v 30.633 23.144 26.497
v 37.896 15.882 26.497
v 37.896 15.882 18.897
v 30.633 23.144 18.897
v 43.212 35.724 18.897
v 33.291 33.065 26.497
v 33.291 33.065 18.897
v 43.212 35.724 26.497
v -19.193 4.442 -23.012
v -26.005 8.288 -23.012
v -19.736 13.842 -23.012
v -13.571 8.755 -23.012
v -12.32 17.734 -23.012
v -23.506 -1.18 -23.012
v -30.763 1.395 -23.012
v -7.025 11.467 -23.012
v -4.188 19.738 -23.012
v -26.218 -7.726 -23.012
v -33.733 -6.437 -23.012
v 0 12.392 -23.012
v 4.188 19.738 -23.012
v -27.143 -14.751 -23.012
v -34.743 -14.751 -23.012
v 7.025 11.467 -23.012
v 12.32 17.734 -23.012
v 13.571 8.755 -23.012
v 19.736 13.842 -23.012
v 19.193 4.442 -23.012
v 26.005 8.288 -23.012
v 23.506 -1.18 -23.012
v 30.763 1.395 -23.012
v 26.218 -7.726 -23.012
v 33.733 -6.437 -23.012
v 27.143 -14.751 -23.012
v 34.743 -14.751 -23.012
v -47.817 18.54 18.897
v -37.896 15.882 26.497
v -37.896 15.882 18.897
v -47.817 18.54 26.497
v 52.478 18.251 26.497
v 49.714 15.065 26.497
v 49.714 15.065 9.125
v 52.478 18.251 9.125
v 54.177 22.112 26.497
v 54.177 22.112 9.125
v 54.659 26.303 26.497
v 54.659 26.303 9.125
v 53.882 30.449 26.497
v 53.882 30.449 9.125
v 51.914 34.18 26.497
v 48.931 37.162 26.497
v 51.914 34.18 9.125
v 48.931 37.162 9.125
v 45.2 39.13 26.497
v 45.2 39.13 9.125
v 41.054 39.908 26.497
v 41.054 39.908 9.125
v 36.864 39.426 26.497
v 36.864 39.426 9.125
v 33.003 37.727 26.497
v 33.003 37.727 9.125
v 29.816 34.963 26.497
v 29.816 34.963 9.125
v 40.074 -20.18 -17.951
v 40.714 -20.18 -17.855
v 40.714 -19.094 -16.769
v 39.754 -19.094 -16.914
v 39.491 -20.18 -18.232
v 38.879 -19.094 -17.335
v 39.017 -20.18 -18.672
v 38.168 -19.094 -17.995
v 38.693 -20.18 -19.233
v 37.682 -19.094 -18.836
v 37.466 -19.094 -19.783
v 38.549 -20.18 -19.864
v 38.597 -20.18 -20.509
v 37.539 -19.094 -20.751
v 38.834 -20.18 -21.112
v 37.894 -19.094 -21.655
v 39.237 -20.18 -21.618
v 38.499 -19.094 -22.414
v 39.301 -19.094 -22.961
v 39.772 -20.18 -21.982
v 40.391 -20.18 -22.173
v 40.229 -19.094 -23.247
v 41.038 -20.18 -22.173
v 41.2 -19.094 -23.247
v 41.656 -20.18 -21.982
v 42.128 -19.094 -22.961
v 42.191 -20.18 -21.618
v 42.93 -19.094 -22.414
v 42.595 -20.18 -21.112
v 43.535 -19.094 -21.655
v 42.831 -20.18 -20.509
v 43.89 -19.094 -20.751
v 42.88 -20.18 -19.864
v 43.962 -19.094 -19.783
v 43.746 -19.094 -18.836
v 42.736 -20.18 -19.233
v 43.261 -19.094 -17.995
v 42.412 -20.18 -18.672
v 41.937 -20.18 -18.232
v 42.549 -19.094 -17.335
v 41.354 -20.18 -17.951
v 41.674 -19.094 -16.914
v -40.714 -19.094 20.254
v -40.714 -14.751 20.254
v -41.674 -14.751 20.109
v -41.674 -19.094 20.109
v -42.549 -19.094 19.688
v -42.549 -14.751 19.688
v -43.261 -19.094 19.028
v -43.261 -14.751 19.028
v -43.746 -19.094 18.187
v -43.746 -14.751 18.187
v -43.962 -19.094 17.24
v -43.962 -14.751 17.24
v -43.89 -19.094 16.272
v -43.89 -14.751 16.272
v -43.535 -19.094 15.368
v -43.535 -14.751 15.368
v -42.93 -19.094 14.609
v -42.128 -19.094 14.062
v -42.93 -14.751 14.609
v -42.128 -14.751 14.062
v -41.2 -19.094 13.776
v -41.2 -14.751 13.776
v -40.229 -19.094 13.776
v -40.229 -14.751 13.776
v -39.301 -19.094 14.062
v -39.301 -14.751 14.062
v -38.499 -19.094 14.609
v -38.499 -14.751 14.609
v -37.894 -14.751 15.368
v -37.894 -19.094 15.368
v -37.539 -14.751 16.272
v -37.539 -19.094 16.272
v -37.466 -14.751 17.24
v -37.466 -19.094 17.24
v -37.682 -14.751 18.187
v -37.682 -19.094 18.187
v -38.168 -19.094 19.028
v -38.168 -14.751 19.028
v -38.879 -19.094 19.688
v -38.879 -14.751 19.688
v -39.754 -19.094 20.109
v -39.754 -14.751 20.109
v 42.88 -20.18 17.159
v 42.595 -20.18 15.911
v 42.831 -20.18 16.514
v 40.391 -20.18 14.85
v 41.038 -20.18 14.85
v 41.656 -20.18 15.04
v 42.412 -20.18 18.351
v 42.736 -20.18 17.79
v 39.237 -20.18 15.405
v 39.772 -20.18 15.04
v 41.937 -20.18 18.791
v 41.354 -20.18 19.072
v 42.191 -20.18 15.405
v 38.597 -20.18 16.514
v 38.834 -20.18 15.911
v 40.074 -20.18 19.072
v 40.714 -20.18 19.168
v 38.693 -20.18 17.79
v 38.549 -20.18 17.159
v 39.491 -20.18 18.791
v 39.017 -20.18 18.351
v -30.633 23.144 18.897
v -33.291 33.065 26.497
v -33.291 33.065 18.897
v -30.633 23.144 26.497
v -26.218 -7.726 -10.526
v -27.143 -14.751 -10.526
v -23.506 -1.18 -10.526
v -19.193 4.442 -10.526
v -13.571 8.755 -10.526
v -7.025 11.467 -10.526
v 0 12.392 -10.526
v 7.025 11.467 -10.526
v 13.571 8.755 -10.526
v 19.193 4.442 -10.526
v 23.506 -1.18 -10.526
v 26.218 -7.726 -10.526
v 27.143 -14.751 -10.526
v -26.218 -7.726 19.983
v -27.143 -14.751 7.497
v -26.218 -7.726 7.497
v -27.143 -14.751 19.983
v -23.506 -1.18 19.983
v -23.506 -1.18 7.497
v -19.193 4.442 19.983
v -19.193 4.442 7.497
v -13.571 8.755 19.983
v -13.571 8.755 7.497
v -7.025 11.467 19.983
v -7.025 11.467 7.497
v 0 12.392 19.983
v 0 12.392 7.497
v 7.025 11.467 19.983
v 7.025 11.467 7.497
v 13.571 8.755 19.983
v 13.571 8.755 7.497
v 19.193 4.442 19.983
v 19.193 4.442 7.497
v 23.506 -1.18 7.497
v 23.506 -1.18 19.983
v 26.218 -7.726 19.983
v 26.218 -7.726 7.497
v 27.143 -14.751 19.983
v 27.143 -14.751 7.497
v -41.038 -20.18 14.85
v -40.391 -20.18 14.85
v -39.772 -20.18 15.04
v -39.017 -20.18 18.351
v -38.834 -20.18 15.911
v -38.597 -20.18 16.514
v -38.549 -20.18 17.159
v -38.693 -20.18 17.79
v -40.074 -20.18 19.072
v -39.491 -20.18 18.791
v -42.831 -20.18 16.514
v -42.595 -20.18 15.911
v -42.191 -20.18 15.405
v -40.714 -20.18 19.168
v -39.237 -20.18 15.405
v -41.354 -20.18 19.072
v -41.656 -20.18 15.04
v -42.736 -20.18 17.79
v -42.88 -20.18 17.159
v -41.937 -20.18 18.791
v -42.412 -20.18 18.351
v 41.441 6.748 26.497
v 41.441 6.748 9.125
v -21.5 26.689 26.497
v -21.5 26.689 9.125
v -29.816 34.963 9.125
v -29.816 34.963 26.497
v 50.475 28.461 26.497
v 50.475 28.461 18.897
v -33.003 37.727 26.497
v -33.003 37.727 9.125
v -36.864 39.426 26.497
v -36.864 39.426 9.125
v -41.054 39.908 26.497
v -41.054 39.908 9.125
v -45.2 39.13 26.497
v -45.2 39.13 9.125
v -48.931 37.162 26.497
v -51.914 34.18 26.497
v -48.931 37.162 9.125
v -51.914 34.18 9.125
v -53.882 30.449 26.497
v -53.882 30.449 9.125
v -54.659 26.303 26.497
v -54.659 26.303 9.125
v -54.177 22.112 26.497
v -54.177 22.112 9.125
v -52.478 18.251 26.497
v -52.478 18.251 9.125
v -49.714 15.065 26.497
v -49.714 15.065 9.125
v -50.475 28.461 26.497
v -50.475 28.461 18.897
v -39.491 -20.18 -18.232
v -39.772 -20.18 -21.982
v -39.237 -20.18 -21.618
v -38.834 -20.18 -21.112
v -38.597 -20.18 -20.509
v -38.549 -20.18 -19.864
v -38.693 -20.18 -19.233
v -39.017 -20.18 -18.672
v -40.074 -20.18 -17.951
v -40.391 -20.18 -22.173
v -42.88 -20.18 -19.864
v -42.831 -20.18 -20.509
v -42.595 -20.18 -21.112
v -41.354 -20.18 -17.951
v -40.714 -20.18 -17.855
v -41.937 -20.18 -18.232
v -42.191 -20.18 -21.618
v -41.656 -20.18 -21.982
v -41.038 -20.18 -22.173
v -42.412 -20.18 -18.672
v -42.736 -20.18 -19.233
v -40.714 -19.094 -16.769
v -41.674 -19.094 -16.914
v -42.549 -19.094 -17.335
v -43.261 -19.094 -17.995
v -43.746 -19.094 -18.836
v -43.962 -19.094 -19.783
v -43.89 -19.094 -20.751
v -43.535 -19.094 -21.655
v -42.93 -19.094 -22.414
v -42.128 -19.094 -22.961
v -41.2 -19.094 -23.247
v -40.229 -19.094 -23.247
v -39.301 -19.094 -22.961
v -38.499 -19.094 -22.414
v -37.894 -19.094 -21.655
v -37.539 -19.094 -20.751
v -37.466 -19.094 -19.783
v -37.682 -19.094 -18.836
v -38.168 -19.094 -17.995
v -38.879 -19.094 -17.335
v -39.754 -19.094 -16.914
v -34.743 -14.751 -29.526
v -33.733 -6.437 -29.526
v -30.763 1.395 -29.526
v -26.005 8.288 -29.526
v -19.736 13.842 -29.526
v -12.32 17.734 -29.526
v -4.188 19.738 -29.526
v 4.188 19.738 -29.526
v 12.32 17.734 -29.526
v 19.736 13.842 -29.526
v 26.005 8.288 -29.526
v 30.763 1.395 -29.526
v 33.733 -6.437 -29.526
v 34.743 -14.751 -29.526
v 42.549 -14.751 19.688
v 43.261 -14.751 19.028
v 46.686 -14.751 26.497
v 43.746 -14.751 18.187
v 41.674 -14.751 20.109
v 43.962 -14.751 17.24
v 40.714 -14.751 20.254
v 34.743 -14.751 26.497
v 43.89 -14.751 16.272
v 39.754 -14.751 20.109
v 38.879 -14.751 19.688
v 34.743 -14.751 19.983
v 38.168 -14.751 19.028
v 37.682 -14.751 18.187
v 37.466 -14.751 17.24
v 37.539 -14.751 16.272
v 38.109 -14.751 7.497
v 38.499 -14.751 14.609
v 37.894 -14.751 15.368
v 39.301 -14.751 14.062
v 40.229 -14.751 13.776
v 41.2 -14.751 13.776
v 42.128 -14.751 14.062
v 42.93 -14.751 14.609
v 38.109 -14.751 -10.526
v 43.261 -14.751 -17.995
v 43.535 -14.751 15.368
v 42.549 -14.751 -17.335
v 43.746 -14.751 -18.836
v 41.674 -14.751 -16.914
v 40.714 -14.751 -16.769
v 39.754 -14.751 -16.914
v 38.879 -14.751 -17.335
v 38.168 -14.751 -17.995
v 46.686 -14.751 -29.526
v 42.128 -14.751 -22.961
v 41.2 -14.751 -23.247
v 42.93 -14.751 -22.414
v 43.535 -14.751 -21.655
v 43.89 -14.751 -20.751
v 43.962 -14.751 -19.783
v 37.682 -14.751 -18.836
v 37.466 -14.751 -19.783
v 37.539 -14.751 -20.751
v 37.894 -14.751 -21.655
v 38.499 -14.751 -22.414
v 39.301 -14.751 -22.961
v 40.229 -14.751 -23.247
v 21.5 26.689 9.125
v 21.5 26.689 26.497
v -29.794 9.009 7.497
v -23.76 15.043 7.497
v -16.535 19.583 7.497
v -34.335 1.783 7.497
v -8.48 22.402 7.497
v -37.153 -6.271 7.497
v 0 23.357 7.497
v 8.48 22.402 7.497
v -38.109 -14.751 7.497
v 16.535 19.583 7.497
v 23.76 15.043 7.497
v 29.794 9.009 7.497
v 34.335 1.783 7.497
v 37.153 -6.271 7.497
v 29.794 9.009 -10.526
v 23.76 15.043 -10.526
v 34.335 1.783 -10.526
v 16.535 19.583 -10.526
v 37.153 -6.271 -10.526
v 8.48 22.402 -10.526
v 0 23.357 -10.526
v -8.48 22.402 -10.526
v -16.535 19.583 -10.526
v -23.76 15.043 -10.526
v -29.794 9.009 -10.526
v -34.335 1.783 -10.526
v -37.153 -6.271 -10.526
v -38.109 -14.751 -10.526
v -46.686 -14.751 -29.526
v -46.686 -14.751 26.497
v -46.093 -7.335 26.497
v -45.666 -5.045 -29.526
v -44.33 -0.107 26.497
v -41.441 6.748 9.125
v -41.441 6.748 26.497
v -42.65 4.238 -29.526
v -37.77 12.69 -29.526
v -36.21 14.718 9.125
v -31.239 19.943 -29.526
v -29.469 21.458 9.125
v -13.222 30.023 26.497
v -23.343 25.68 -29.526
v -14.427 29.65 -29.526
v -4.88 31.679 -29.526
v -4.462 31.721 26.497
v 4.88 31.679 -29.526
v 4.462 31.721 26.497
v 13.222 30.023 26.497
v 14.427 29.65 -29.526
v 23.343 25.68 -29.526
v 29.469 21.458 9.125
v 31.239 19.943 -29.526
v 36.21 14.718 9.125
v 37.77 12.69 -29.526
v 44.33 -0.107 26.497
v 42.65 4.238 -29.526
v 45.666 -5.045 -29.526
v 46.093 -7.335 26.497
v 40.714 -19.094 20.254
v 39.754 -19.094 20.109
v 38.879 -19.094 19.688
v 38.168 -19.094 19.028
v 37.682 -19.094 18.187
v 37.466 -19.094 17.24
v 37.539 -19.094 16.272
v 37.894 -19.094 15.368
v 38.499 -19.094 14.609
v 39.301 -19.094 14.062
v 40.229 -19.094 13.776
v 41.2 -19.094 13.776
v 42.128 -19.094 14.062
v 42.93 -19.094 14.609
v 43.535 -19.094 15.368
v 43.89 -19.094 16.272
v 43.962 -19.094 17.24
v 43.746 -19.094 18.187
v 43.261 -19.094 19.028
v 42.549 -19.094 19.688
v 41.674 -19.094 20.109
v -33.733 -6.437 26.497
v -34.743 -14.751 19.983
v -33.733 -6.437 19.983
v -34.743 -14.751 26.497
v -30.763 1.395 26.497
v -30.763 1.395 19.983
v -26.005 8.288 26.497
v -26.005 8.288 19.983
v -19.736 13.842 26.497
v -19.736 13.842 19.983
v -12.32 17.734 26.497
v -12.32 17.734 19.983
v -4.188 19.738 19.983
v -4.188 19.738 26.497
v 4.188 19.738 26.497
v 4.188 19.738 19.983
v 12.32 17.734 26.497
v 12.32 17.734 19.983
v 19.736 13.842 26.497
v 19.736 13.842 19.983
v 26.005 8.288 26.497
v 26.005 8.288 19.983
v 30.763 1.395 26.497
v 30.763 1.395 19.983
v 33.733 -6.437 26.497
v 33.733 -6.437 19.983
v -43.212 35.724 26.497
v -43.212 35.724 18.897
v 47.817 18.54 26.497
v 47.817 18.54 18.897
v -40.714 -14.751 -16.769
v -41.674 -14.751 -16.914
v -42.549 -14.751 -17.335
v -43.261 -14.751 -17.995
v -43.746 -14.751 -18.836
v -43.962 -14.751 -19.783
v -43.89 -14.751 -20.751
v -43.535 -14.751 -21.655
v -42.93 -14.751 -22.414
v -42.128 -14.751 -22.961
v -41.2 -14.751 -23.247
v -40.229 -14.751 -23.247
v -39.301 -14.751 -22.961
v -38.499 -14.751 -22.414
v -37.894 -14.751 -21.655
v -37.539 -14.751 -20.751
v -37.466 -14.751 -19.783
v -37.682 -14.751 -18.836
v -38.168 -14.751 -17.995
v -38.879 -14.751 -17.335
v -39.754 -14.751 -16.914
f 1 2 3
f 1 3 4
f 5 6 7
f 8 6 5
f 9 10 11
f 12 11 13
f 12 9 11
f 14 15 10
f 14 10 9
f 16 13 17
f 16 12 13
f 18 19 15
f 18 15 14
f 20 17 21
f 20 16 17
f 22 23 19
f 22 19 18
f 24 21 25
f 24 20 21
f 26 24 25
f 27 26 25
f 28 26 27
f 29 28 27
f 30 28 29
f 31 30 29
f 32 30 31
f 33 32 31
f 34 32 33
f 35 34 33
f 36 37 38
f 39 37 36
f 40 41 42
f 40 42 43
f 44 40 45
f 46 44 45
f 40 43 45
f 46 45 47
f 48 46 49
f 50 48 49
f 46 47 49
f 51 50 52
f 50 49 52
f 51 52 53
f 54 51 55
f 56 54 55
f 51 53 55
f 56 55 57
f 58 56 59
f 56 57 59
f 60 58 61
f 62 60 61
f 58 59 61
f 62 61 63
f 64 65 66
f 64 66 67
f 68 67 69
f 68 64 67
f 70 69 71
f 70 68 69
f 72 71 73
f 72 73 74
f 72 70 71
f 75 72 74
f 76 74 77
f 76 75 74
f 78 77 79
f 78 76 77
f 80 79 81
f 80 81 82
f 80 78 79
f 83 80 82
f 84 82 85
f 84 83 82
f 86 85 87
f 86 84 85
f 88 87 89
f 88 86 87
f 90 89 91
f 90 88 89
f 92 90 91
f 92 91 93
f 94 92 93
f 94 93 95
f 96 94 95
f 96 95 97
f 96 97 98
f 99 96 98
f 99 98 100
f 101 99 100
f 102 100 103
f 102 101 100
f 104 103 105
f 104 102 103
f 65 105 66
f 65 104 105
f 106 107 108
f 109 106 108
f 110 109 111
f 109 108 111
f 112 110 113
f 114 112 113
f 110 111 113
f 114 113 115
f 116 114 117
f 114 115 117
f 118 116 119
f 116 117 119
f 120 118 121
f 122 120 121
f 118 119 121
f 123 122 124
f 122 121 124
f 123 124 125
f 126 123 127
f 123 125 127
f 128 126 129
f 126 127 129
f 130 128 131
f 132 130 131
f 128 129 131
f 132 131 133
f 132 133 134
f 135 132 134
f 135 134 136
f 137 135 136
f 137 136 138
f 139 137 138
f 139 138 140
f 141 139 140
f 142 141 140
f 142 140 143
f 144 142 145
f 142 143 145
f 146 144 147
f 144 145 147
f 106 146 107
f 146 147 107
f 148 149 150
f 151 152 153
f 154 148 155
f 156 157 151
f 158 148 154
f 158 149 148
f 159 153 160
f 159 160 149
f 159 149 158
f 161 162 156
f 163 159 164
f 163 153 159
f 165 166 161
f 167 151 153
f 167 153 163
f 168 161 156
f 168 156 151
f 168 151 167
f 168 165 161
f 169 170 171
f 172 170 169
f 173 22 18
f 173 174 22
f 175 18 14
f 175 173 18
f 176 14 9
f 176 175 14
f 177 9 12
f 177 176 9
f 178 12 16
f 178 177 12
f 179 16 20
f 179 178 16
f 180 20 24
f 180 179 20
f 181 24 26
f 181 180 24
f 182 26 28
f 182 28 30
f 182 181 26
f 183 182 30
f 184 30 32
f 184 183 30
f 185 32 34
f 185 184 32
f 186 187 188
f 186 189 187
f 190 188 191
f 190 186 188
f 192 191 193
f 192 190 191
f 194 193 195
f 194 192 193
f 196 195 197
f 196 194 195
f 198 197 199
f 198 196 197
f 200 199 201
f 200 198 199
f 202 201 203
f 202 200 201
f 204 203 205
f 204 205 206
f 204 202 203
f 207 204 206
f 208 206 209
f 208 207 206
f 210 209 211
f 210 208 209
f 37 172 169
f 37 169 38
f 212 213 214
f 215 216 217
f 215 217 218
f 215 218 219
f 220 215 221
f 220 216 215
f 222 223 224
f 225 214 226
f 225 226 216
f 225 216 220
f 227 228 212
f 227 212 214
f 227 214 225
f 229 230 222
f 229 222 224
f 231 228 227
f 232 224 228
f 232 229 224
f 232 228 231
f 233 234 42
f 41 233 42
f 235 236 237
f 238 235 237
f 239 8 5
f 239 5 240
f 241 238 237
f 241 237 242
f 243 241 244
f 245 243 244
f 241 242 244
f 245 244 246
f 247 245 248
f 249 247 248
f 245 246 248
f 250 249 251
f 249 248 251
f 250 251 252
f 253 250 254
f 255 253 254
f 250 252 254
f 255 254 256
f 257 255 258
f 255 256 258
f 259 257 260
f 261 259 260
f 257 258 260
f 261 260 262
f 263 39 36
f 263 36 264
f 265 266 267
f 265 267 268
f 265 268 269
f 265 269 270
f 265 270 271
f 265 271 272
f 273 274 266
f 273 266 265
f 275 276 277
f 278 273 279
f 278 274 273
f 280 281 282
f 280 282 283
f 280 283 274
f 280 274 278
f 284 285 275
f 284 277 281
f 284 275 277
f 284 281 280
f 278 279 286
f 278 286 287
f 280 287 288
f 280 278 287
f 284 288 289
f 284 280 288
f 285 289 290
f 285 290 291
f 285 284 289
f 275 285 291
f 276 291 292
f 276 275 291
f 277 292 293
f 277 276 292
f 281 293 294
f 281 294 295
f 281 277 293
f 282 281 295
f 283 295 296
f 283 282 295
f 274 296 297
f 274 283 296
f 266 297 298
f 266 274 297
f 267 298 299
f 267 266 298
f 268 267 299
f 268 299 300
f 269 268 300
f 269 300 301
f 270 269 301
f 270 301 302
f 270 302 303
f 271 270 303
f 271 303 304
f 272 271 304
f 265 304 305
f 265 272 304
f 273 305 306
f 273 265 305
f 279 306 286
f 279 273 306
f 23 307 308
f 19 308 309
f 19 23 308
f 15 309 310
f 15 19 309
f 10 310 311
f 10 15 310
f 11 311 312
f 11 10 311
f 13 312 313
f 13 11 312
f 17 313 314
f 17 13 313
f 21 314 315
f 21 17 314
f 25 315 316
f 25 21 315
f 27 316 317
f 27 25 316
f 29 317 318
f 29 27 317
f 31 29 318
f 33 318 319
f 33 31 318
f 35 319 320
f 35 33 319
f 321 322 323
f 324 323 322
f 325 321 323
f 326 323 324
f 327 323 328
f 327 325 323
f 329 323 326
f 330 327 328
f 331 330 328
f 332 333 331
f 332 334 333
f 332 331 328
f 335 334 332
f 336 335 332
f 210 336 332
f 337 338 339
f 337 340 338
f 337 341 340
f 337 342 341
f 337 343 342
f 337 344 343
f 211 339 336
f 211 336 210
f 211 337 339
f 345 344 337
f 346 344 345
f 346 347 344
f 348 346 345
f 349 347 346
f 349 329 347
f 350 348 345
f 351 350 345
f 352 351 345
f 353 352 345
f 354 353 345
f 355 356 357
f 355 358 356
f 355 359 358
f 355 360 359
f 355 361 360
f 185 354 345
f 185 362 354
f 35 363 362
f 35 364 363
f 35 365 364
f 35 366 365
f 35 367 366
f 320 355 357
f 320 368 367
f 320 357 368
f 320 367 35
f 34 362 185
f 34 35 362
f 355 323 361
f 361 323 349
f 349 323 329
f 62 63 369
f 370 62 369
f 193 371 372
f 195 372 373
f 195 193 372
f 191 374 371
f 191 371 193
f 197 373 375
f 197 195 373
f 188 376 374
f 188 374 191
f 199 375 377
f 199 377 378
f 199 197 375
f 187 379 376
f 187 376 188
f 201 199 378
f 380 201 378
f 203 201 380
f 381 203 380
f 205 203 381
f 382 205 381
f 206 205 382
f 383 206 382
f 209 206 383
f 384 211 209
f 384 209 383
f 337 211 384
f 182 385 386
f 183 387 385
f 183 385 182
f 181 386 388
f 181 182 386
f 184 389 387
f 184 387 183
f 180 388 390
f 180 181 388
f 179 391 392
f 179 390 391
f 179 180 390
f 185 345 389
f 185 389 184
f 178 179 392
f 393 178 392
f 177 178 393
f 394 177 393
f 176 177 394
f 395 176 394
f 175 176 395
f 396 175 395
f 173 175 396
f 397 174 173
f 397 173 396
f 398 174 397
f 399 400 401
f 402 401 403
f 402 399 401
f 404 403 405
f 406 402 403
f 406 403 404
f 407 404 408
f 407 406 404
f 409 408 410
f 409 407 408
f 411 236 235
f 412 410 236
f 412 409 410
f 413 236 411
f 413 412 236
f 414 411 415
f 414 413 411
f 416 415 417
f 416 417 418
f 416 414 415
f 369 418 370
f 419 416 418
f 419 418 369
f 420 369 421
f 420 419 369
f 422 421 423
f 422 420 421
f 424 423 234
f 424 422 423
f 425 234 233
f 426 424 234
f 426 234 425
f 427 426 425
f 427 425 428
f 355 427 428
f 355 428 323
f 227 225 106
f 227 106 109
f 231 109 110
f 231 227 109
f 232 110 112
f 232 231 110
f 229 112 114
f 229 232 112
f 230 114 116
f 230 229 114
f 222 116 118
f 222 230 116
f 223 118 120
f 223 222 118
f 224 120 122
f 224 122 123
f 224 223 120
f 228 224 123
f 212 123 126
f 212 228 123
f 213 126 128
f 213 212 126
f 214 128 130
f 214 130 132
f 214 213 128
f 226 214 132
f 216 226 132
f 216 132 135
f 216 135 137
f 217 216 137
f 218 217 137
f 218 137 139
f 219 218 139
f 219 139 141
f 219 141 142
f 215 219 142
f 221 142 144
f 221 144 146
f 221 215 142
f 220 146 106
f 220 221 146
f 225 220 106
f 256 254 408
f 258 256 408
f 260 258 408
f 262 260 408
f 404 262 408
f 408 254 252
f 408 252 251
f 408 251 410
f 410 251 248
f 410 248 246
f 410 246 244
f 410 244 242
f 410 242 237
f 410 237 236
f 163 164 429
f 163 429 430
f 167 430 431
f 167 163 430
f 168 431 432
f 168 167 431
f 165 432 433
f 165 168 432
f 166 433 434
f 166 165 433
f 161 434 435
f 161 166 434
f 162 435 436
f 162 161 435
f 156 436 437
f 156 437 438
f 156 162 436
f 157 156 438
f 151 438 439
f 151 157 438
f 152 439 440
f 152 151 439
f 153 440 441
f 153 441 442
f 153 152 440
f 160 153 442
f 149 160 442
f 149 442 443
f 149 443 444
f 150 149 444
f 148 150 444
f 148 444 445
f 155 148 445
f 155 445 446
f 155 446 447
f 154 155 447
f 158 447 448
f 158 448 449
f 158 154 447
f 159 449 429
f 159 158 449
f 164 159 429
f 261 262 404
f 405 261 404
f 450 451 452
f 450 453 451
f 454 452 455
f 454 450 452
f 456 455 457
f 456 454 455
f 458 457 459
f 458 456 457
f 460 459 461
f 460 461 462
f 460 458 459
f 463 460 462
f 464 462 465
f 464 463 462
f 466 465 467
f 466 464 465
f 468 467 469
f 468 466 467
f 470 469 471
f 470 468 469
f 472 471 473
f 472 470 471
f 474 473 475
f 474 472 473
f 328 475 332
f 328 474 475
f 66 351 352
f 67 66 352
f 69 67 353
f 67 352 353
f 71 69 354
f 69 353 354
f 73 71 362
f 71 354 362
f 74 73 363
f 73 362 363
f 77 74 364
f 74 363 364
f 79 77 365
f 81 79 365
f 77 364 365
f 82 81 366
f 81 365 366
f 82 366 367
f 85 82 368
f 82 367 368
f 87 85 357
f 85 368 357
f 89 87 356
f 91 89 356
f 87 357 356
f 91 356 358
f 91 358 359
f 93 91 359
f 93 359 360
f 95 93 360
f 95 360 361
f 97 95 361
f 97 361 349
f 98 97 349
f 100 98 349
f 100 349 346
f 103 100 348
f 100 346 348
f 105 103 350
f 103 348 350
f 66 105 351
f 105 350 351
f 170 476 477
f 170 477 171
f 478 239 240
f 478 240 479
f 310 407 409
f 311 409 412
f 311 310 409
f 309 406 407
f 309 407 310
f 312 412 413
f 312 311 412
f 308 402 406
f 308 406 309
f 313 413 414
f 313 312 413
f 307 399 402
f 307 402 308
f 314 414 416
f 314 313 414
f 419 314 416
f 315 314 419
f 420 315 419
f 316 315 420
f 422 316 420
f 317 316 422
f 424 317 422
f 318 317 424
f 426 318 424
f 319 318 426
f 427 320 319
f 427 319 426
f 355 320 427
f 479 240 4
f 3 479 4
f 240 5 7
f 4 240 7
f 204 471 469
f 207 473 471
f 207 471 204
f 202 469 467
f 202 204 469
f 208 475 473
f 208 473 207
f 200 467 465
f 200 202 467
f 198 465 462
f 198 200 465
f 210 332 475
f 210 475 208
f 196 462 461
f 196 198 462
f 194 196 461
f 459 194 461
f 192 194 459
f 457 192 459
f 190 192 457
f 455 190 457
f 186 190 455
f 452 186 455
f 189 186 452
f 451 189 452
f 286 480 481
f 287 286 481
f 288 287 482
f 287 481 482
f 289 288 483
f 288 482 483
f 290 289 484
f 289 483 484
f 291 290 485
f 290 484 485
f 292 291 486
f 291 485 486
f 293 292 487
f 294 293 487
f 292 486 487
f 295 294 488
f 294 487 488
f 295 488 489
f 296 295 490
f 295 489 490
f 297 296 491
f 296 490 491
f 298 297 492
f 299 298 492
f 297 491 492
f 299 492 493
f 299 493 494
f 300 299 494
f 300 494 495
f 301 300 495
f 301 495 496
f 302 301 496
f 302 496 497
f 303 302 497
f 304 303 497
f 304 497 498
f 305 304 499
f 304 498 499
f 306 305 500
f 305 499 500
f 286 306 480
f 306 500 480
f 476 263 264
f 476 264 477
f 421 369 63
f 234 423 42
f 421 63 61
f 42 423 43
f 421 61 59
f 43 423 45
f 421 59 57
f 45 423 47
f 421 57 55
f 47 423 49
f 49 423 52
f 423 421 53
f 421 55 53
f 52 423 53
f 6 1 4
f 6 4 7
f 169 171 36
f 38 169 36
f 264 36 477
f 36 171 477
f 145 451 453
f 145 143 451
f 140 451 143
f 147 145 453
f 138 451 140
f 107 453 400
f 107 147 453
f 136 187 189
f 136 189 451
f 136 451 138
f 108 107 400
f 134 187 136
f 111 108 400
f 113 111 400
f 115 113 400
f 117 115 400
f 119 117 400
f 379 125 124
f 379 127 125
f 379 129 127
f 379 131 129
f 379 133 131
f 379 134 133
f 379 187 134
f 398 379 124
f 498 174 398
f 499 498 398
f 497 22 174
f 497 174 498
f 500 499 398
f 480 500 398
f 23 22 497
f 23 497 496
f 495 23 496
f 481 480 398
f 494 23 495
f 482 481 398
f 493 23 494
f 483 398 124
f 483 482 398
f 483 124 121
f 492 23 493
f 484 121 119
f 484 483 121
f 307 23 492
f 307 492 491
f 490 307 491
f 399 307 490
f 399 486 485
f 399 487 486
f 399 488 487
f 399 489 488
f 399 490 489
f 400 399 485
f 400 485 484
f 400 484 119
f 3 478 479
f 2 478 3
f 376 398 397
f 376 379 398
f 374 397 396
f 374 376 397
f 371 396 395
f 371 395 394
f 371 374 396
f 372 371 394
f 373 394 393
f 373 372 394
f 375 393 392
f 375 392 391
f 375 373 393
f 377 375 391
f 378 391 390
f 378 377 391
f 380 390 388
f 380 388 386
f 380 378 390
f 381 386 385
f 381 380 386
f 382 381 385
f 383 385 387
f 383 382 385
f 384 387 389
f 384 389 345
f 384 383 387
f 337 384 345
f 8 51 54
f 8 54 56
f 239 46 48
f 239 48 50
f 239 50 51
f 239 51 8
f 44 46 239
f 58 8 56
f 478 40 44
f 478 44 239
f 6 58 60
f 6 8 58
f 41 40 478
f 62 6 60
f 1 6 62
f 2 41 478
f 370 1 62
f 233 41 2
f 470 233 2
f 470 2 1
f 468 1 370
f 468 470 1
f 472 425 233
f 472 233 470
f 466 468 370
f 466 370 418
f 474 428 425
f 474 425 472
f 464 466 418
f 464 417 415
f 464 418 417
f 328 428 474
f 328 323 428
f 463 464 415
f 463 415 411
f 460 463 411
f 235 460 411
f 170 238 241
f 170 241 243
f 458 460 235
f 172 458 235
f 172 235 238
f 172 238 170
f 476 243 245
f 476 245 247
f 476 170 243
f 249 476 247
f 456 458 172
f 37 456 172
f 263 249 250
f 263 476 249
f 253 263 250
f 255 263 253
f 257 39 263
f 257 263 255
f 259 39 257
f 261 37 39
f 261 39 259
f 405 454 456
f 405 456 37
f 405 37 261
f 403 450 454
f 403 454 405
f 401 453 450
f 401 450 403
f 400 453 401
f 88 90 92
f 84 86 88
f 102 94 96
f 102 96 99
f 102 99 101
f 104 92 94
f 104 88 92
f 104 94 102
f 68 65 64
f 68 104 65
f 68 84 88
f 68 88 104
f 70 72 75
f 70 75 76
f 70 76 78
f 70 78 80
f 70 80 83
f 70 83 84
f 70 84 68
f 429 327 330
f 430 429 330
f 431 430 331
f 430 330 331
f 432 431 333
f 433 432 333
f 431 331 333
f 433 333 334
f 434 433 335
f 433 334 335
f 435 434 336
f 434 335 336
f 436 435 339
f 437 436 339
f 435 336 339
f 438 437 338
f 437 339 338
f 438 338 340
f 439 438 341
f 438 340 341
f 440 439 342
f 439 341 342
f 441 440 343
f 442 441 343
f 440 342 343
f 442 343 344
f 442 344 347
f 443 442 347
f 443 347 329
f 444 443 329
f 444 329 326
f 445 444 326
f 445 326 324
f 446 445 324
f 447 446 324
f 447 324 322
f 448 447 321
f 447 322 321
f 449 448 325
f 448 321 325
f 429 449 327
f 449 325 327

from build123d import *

# Parameters (mm, degrees)
SKETCH2_W               = 113.16294167
SKETCH2_H               = 44.385347151
CUT_EXTRUDE1_DEPTH      = 40.876559531
BOSS_EXTRUDE1_START     = -8
BOSS_EXTRUDE1_DEPTH     = 8
CORTAR_EXTRUIR1_DEPTH   = 3.5
SKETCH4_R               = 1.5
SALIENTE_EXTRUIR1_DEPTH = 2.5
CHAFL_N5_SIZE           = 0.5
SCALE1_SCALE            = 2.1714285


with BuildPart() as part:
    # Sketch1 → Revolve1 (revolve)
    with BuildSketch(Plane(origin=(0, 0, 0), x_dir=(1, 0, 0), z_dir=(0, 1, 0))):
        Polygon((21.5, 12.9), (16, 12.9), (16, 9.9), (12.5, 9.9), (12.5, 4.15), (17.55, 4.15), (17.55, -4.15), (12.5, -4.15), (12.5, -9.9), (16, -9.9), (16, -12.9), (21.5, -12.9), align=None)
    revolve(axis=Axis((0, 0, 0), (0, 0, -1)))

    # Sketch2 → Cut-Extrude1 (cut, through all)
    with BuildSketch(Plane(origin=(0, 0, -12.9), x_dir=(-1, 0, 0), z_dir=(0, 0, -1))):
        with Locations((0, -22.192673576)):
            Rectangle(SKETCH2_W, SKETCH2_H)
    extrude(amount=-CUT_EXTRUDE1_DEPTH, mode=Mode.SUBTRACT)

    # Sketch3 → Boss-Extrude1 (add)
    with BuildSketch(Plane.XY.offset(12.9).offset(BOSS_EXTRUDE1_START)):
        with BuildLine():
            ThreePointArc((9.901123545, 19.084489842), (15.202795796, 15.202795796), (19.084489842, 9.901123545))
            Line((19.084489842, 9.901123545), (22.894785555, 13.731141284))
            ThreePointArc((22.894785555, 13.731141284), (23.272346041, 23.272346041), (13.731141284, 22.894785555))
            Line((13.731141284, 22.894785555), (9.901123545, 19.084489842))
        make_face()
        with BuildLine():
            Line((-9.901123545, 19.084489842), (-13.731141284, 22.894785555))
            ThreePointArc((-13.731141284, 22.894785555), (-23.272346041, 23.272346041), (-22.894785555, 13.731141284))
            Line((-22.894785555, 13.731141284), (-19.084489842, 9.901123545))
            ThreePointArc((-19.084489842, 9.901123545), (-15.202795796, 15.202795796), (-9.901123545, 19.084489842))
        make_face()
    extrude(amount=BOSS_EXTRUDE1_DEPTH)

    # Croquis6 → Cortar-Extruir1 (cut)
    with BuildSketch(Plane.XY.offset(12.9)):
        Polygon((-15.331536888, 22.020767038), (-14.107322805, 17.45193788), (-17.45193788, 14.107322805), (-22.020767038, 15.331536888), (-23.244981122, 19.900366047), (-19.900366047, 23.244981122), align=None)
        Polygon((15.331536888, 22.020767038), (19.90036573, 23.244982303), (23.24497994, 19.900366363), (22.020767038, 15.331536888), (17.451938197, 14.107321624), (14.107323987, 17.451937564), align=None)
    extrude(amount=-CORTAR_EXTRUIR1_DEPTH, mode=Mode.SUBTRACT)

    # Sketch4 → Saliente-Extruir1 (add)
    with BuildSketch(Plane.XZ):
        with Locations(Location((-18.75, 8.525, 0), (0, 0, 90))):
            Circle(SKETCH4_R)
        with Locations(Location((18.75, -8.525, 0), (0, 0, 90))):
            Circle(SKETCH4_R)
        with Locations(Location((18.75, 8.525, 0), (0, 0, 90))):
            Circle(SKETCH4_R)
        with Locations(Location((-18.75, -8.525, 0), (0, 0, 90))):
            Circle(SKETCH4_R)
    extrude(amount=SALIENTE_EXTRUIR1_DEPTH)

    # Chaflán5
    chafl_n5_edges = [part.edges().sort_by_distance(p)[0] for p in [
        (-18.75, -2.5, 7.025),
        (18.75, -2.5, 7.025),
        (18.75, -2.5, -10.025),
        (-18.75, -2.5, -10.025),
    ]]
    chamfer(chafl_n5_edges, length=CHAFL_N5_SIZE)


with BuildPart() as part_1:
    # Scale1: scaled about (0, 12.592522151, 1.292940279)
    add(part.part.scale(SCALE1_SCALE).moved(Location((0, -14.751239335, -1.514587092))))


solid = part_1.part
